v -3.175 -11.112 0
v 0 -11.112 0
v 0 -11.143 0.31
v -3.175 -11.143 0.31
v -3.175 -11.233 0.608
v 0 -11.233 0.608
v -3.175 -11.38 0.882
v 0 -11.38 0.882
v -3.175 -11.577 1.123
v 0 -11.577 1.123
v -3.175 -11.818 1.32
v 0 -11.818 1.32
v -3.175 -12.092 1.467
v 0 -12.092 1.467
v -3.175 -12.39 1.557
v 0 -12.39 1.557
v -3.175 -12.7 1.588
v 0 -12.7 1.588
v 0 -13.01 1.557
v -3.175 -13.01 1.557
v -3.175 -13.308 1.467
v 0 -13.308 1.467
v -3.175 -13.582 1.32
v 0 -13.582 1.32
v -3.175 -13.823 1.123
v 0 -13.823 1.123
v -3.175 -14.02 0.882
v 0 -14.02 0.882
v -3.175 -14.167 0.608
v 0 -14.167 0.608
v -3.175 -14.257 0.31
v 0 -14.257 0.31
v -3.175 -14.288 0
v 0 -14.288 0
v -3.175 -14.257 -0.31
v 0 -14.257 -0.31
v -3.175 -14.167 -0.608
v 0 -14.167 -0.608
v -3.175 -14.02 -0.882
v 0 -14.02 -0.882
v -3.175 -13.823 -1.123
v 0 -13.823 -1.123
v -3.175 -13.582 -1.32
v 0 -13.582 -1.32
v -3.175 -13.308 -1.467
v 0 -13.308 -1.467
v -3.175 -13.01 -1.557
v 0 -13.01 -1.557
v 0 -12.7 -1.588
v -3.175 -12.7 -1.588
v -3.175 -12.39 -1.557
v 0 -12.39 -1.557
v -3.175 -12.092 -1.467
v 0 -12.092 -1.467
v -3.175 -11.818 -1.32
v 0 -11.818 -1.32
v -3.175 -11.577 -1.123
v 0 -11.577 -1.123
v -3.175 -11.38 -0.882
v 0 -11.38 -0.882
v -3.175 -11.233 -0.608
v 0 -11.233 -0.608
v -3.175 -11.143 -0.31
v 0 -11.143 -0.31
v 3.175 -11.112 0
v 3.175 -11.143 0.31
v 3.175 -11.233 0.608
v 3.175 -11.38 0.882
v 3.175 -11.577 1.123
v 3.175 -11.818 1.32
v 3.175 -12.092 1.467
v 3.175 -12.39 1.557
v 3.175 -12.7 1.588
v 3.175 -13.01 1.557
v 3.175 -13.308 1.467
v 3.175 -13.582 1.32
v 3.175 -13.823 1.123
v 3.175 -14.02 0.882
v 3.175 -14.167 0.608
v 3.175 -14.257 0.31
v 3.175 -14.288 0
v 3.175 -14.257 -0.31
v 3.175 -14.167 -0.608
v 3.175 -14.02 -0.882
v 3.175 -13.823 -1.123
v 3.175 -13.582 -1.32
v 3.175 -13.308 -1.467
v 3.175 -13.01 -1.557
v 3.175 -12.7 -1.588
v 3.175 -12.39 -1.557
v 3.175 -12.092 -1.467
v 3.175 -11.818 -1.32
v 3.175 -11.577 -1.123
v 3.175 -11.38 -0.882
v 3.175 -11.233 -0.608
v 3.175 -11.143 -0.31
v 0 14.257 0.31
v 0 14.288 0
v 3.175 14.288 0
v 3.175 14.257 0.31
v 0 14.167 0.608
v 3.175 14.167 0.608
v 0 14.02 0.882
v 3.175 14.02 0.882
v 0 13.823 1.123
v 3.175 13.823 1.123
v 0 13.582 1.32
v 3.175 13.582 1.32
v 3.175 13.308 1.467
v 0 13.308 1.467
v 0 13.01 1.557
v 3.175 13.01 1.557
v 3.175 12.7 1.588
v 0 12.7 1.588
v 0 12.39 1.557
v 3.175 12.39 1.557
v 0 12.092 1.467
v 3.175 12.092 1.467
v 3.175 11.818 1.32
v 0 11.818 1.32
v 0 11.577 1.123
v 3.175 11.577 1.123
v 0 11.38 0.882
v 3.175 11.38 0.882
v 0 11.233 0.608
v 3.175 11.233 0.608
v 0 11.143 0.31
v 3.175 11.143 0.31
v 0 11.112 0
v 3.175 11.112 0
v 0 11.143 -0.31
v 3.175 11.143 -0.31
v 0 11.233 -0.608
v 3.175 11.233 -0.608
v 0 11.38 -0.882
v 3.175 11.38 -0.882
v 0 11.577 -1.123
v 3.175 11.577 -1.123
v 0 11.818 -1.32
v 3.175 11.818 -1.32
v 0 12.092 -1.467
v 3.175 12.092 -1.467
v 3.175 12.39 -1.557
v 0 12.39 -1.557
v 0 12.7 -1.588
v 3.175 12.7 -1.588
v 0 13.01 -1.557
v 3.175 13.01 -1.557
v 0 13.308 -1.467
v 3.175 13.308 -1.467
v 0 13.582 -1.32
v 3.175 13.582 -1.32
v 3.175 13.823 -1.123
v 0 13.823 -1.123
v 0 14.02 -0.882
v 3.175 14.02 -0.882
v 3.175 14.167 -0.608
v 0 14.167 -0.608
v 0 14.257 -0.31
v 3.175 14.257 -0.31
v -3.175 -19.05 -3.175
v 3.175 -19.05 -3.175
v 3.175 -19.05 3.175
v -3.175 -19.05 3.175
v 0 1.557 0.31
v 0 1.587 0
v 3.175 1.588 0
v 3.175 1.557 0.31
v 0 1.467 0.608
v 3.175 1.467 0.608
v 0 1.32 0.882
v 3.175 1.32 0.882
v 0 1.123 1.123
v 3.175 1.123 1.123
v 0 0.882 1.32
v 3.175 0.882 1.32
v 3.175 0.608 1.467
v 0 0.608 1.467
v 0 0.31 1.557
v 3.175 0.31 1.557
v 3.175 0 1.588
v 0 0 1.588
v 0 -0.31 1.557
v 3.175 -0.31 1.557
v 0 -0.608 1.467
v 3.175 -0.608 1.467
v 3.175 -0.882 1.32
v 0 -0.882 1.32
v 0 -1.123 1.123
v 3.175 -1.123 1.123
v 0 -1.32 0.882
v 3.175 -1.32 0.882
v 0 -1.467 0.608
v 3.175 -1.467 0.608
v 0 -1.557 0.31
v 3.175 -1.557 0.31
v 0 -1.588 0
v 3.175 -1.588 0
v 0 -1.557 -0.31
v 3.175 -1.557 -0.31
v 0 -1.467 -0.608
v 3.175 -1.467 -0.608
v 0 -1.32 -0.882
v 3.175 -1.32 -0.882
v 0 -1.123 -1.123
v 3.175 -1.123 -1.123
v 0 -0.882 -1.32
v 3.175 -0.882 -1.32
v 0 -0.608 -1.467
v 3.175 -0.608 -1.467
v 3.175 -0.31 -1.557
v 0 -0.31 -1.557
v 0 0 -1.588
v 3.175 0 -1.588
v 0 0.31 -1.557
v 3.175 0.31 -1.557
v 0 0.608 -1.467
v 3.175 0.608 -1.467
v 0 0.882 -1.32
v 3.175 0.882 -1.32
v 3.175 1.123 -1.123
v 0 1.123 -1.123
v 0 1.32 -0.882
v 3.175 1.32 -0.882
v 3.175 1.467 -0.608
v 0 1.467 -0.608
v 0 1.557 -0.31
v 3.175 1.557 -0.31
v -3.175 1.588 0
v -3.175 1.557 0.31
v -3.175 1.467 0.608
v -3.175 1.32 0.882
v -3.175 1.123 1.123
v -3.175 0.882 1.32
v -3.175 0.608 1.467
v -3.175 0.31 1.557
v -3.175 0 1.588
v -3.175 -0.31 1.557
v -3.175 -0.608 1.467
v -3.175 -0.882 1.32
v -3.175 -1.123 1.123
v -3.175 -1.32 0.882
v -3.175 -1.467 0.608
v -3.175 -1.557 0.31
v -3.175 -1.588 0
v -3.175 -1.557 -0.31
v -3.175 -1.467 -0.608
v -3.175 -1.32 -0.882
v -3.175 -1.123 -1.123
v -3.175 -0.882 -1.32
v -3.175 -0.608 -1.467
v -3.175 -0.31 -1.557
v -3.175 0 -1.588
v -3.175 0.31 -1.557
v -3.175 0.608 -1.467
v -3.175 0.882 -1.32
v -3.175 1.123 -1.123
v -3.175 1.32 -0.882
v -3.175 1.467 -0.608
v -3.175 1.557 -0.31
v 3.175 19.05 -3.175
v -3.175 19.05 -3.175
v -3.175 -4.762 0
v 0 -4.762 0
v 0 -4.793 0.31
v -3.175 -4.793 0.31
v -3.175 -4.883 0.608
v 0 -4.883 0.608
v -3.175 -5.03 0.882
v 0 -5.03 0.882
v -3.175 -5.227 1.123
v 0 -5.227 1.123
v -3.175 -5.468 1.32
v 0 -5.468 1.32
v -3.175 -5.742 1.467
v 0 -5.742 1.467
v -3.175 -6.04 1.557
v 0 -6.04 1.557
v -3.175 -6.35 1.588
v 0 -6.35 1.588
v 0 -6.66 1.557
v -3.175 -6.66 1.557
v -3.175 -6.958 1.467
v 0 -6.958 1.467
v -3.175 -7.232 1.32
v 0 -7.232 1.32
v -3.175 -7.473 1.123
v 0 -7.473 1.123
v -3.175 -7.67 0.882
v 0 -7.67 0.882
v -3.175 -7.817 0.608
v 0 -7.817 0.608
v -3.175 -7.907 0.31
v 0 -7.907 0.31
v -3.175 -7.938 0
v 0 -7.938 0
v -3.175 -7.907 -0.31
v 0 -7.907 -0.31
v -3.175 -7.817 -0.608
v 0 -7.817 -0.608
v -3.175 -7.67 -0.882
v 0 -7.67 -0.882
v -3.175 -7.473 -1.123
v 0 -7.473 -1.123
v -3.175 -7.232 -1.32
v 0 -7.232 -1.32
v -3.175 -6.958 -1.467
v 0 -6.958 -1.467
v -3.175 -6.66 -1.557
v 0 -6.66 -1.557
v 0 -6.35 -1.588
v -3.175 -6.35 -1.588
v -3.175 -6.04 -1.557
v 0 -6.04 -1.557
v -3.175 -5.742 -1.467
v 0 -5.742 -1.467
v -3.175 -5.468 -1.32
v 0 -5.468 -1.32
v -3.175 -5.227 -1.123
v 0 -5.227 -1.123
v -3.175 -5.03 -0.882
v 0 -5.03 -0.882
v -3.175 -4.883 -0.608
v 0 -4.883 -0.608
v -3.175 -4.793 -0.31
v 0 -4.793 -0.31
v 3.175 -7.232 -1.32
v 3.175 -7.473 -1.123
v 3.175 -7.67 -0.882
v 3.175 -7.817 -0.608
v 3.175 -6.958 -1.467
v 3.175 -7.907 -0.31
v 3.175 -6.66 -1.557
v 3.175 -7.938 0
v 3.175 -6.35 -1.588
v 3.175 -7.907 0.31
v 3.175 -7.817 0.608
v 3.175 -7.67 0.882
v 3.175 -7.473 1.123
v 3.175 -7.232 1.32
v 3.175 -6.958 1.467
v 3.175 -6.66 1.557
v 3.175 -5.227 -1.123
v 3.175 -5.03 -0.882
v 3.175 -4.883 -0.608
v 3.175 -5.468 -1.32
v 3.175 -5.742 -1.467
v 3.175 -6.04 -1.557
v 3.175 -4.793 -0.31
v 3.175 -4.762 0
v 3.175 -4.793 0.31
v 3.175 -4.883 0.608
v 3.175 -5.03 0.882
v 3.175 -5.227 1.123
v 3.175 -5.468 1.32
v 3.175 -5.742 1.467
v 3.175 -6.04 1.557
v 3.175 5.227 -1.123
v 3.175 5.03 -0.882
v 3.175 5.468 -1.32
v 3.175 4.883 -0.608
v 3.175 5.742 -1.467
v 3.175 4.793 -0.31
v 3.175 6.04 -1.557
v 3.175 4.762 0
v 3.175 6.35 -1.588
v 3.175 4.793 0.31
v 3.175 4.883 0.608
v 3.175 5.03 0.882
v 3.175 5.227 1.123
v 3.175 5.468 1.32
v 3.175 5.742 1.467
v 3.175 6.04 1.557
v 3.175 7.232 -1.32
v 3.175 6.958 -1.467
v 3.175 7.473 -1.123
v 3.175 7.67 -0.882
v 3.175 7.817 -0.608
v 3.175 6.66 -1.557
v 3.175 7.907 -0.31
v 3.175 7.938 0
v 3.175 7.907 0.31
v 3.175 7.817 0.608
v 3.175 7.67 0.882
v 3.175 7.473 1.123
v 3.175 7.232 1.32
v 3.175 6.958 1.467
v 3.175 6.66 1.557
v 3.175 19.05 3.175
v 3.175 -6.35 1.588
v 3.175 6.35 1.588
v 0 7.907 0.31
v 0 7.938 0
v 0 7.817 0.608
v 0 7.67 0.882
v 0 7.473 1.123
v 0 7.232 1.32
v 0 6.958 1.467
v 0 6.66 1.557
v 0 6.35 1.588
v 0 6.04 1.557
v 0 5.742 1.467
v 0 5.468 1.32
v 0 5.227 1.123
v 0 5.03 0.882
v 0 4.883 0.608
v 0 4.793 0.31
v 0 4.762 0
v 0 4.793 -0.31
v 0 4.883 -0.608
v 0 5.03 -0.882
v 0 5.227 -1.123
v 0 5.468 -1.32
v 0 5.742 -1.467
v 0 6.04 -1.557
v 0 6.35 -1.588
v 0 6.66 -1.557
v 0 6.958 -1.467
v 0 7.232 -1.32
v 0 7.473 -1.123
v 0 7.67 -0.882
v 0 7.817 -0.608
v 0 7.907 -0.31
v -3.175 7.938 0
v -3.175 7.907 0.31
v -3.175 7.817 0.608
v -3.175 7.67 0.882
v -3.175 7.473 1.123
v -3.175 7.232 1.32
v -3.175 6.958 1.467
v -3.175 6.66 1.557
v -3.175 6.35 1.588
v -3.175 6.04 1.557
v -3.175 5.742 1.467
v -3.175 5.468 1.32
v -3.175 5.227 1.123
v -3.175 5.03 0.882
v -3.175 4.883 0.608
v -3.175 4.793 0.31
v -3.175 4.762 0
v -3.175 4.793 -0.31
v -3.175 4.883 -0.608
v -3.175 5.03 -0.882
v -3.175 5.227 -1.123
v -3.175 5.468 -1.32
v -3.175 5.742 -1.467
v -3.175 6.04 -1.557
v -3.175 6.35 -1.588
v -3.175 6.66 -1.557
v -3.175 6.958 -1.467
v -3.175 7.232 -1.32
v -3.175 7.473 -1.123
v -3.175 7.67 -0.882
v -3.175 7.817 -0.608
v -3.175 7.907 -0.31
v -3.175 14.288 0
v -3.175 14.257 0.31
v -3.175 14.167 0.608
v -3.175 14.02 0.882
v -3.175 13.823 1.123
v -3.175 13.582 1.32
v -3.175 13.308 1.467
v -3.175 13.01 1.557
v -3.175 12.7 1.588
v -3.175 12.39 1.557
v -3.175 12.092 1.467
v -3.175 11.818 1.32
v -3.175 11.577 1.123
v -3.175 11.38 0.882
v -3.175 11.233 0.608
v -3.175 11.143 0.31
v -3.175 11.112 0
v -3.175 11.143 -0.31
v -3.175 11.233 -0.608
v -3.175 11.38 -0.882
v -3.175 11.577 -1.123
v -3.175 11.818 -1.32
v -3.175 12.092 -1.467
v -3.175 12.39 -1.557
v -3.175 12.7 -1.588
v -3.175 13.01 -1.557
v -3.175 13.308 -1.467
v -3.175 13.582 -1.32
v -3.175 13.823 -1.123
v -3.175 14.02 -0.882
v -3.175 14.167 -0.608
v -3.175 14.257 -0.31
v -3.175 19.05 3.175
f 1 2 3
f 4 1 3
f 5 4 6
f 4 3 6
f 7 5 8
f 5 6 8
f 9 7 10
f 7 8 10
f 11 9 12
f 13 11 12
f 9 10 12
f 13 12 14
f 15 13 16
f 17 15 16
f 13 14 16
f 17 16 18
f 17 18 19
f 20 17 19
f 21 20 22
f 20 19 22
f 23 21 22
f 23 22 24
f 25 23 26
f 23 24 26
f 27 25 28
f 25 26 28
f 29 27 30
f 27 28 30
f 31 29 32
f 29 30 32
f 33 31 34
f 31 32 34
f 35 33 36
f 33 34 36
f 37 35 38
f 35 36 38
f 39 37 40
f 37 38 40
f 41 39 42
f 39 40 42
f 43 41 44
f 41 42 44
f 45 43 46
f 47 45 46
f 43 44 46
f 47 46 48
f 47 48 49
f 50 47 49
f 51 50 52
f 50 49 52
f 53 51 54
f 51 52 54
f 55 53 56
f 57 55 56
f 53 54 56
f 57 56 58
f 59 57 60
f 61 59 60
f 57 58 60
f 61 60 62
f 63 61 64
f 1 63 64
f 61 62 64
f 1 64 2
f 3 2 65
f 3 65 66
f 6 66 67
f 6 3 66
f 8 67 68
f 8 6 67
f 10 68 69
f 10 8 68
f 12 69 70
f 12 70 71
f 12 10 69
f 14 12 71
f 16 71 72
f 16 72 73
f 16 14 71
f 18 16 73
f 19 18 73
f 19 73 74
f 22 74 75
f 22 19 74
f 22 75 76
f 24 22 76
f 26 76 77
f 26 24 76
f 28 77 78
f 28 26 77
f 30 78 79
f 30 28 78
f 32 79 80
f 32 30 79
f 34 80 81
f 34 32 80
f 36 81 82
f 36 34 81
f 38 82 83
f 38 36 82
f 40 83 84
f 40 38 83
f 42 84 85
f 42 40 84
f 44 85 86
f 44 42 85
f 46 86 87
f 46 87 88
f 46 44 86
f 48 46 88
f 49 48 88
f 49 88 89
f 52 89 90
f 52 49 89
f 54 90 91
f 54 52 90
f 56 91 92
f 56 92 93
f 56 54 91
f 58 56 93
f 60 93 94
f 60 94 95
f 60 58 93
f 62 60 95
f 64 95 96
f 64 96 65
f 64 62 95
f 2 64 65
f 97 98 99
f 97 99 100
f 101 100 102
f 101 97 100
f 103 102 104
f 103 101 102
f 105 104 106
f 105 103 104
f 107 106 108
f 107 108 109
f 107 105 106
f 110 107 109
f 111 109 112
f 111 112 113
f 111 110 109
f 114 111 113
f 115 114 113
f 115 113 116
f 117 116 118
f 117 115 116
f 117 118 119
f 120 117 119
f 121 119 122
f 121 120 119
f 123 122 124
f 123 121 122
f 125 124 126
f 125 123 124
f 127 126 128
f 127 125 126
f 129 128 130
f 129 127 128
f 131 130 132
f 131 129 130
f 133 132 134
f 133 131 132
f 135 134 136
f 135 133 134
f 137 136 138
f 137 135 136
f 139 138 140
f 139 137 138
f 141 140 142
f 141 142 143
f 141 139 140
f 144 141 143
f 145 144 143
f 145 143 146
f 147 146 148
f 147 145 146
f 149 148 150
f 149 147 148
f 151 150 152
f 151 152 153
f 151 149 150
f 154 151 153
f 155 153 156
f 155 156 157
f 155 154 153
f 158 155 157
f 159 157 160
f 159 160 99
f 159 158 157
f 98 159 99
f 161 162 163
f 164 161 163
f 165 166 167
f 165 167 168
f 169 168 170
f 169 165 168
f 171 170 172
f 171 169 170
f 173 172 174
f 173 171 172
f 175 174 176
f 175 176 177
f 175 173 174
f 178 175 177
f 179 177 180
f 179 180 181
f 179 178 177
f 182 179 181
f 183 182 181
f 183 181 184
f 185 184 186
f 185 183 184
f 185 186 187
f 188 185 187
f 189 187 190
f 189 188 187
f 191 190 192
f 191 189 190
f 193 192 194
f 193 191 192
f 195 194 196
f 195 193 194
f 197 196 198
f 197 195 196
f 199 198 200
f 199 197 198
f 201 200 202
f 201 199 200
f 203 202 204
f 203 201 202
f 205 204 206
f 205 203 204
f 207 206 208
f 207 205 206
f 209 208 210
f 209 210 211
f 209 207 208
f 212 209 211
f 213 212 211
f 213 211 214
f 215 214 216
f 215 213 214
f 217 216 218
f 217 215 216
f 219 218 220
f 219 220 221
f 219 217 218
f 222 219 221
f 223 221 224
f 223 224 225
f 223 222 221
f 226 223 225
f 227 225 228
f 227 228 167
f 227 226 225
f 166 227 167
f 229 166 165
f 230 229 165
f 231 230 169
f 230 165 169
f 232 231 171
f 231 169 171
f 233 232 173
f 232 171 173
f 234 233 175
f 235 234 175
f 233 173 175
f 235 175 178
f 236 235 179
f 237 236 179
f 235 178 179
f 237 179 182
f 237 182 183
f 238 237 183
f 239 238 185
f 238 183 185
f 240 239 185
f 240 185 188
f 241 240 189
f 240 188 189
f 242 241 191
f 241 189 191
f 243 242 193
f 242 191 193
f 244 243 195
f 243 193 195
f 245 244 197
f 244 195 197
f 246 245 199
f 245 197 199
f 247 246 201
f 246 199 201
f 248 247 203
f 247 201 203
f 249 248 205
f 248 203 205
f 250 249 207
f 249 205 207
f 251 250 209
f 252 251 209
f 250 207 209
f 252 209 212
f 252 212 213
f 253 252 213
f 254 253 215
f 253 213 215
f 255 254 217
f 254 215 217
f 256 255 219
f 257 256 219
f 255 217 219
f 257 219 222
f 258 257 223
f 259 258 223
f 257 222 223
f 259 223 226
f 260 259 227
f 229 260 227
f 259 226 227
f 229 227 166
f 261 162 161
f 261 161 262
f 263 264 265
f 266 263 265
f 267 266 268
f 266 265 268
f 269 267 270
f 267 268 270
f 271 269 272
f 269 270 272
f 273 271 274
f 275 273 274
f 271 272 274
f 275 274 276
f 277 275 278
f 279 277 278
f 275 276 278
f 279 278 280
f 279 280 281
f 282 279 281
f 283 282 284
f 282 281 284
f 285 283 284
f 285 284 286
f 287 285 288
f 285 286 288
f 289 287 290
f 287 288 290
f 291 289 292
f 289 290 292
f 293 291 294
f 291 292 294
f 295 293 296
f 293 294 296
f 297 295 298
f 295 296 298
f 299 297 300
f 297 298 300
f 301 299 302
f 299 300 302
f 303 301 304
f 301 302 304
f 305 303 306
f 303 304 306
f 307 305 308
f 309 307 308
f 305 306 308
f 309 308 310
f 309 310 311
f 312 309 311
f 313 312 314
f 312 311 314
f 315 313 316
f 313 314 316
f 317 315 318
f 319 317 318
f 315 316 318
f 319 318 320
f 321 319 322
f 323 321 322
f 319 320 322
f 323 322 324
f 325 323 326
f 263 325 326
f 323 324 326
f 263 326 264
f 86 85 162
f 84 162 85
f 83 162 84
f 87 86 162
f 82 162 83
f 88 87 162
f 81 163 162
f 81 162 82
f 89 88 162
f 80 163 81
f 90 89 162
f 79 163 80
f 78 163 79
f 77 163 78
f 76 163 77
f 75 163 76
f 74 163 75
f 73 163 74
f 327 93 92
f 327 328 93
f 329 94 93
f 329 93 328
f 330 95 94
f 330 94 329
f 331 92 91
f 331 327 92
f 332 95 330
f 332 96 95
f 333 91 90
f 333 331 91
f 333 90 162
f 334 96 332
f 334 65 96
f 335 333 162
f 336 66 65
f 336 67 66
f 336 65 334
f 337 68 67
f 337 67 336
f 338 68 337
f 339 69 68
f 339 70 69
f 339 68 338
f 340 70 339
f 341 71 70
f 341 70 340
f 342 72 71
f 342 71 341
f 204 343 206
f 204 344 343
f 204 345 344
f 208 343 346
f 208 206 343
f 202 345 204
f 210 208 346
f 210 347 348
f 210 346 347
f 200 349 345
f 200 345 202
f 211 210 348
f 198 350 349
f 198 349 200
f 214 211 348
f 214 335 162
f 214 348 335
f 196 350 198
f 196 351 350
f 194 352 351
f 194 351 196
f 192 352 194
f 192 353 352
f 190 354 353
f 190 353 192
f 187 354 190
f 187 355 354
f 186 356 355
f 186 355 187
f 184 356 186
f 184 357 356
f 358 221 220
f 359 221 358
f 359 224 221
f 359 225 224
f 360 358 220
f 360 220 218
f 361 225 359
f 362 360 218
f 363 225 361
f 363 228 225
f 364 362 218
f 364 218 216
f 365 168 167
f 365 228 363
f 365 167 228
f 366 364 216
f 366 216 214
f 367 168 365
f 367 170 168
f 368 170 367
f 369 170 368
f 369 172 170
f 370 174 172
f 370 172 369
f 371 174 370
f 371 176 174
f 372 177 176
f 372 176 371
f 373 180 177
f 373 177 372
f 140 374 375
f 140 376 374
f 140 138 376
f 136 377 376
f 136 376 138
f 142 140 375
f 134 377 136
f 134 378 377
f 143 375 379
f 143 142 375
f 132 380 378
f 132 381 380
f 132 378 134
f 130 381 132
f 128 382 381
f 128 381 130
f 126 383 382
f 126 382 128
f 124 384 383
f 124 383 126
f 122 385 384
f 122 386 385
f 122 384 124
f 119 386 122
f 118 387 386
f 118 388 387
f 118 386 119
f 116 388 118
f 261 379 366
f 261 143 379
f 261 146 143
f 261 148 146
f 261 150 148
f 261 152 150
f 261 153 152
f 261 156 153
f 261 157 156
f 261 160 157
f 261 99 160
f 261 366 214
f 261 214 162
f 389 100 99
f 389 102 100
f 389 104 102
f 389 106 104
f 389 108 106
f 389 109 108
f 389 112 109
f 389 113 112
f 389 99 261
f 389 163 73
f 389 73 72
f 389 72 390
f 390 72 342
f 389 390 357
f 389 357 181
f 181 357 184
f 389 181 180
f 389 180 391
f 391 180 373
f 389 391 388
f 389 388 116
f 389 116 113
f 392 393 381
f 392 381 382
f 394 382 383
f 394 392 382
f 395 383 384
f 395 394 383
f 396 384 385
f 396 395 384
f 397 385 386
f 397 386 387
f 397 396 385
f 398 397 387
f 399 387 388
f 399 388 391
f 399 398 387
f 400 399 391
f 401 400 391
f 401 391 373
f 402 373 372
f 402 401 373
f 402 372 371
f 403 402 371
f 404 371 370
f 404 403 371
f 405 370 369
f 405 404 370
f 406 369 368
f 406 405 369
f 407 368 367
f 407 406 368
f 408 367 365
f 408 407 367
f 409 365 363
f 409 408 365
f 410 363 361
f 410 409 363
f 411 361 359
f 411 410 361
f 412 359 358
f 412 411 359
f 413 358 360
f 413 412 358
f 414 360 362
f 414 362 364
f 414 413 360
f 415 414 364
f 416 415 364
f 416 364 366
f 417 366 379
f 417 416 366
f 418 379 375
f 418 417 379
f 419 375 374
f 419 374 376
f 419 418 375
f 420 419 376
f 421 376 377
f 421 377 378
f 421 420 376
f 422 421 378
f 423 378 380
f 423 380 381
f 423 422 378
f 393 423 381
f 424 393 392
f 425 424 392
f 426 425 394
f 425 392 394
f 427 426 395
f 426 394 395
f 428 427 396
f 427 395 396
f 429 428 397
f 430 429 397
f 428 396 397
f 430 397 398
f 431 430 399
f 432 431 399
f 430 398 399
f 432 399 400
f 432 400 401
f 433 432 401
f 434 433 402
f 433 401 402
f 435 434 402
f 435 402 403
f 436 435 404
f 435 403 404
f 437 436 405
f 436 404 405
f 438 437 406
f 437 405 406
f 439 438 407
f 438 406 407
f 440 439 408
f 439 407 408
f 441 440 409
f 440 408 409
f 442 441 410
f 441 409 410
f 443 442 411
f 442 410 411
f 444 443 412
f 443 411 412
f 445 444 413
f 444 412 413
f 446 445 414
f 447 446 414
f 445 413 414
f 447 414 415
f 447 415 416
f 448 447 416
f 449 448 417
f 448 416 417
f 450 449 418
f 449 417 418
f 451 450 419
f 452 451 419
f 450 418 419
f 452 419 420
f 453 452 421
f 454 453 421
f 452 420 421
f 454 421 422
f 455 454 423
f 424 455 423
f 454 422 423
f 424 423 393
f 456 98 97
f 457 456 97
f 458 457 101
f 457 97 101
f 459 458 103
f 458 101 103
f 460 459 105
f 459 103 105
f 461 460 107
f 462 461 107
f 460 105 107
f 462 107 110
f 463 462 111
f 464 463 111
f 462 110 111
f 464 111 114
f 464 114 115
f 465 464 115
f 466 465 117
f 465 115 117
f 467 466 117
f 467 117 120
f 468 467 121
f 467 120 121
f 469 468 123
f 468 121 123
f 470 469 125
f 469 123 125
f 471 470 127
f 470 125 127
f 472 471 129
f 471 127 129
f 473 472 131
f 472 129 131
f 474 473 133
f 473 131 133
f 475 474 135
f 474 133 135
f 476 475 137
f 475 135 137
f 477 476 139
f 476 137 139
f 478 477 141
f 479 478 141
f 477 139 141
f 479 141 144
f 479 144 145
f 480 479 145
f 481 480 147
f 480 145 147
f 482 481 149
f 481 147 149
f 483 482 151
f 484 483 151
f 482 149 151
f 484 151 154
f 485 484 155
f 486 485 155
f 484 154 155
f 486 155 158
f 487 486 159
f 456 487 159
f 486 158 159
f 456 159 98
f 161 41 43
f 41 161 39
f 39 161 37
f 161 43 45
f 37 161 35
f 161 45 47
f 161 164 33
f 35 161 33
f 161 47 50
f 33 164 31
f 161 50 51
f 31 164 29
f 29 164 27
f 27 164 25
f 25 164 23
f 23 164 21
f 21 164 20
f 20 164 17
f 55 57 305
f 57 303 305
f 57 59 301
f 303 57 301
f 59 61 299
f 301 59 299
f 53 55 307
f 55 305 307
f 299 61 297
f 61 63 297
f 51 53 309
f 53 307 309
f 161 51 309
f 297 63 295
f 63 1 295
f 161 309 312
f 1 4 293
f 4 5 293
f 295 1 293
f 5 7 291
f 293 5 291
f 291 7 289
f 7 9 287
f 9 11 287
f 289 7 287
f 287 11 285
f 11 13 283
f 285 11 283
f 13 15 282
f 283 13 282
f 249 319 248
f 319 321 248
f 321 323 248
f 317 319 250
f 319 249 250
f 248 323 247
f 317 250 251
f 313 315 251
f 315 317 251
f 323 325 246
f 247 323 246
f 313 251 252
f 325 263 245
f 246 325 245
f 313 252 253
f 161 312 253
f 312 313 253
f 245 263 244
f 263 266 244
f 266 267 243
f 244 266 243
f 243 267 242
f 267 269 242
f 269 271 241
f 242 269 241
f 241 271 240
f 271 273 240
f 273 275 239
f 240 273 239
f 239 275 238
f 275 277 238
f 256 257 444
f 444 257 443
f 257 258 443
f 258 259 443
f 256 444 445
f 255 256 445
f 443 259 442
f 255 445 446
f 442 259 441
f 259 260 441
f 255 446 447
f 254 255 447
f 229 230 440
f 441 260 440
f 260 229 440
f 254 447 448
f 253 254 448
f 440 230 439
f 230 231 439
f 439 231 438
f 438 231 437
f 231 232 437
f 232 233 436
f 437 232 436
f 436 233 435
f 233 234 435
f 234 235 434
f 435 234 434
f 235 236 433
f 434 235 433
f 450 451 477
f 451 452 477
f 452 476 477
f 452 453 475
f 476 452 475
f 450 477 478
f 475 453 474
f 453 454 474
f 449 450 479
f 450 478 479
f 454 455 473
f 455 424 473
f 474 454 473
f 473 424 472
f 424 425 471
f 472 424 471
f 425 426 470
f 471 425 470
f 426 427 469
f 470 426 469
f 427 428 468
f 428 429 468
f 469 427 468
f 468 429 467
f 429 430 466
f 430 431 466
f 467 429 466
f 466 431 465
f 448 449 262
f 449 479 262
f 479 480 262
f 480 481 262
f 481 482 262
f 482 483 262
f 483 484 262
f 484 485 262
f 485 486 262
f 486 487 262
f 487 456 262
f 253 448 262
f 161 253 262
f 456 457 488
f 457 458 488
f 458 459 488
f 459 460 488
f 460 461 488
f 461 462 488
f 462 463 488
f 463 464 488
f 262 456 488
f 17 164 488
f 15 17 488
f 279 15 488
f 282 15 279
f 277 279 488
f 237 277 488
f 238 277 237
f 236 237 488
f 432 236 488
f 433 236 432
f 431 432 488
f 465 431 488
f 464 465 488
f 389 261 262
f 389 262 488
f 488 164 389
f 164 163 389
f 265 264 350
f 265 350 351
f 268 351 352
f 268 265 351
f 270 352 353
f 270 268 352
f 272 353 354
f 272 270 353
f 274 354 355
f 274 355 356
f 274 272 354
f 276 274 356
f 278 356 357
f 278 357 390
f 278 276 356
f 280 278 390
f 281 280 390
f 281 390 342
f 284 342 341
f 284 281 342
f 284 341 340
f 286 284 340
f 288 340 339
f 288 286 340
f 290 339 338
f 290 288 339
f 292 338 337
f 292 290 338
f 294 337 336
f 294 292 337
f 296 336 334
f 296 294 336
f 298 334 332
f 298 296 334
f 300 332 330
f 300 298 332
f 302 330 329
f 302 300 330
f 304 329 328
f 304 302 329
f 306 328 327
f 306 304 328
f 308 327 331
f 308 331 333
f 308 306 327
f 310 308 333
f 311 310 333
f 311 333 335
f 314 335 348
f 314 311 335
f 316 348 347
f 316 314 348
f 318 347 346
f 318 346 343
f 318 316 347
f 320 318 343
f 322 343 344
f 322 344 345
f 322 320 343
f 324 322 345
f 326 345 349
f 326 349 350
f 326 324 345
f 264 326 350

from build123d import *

# Parameters (mm, degrees)
F0_W          = 38.1
F0_H          = 6.35
F0_R          = 1.5875
F1_DEPTH      = 3.175
F1_DEPTH_BACK = 3.175


with BuildPart() as f1:
    # F0 (on Right) → F1 (new body, two sides)
    with BuildSketch(Plane.YZ) as f1_sk:
        Rectangle(F0_W, F0_H)
        with Locations((-12.7, 0)):
            Circle(F0_R, mode=Mode.SUBTRACT)
        with Locations((-6.35, 0)):
            Circle(F0_R, mode=Mode.SUBTRACT)
        Circle(F0_R, mode=Mode.SUBTRACT)
        with Locations((6.35, 0)):
            Circle(F0_R, mode=Mode.SUBTRACT)
        with Locations((12.7, 0)):
            Circle(F0_R, mode=Mode.SUBTRACT)
    extrude(amount=F1_DEPTH)
    extrude(f1_sk.sketch, amount=-F1_DEPTH_BACK)


solid = f1.part
